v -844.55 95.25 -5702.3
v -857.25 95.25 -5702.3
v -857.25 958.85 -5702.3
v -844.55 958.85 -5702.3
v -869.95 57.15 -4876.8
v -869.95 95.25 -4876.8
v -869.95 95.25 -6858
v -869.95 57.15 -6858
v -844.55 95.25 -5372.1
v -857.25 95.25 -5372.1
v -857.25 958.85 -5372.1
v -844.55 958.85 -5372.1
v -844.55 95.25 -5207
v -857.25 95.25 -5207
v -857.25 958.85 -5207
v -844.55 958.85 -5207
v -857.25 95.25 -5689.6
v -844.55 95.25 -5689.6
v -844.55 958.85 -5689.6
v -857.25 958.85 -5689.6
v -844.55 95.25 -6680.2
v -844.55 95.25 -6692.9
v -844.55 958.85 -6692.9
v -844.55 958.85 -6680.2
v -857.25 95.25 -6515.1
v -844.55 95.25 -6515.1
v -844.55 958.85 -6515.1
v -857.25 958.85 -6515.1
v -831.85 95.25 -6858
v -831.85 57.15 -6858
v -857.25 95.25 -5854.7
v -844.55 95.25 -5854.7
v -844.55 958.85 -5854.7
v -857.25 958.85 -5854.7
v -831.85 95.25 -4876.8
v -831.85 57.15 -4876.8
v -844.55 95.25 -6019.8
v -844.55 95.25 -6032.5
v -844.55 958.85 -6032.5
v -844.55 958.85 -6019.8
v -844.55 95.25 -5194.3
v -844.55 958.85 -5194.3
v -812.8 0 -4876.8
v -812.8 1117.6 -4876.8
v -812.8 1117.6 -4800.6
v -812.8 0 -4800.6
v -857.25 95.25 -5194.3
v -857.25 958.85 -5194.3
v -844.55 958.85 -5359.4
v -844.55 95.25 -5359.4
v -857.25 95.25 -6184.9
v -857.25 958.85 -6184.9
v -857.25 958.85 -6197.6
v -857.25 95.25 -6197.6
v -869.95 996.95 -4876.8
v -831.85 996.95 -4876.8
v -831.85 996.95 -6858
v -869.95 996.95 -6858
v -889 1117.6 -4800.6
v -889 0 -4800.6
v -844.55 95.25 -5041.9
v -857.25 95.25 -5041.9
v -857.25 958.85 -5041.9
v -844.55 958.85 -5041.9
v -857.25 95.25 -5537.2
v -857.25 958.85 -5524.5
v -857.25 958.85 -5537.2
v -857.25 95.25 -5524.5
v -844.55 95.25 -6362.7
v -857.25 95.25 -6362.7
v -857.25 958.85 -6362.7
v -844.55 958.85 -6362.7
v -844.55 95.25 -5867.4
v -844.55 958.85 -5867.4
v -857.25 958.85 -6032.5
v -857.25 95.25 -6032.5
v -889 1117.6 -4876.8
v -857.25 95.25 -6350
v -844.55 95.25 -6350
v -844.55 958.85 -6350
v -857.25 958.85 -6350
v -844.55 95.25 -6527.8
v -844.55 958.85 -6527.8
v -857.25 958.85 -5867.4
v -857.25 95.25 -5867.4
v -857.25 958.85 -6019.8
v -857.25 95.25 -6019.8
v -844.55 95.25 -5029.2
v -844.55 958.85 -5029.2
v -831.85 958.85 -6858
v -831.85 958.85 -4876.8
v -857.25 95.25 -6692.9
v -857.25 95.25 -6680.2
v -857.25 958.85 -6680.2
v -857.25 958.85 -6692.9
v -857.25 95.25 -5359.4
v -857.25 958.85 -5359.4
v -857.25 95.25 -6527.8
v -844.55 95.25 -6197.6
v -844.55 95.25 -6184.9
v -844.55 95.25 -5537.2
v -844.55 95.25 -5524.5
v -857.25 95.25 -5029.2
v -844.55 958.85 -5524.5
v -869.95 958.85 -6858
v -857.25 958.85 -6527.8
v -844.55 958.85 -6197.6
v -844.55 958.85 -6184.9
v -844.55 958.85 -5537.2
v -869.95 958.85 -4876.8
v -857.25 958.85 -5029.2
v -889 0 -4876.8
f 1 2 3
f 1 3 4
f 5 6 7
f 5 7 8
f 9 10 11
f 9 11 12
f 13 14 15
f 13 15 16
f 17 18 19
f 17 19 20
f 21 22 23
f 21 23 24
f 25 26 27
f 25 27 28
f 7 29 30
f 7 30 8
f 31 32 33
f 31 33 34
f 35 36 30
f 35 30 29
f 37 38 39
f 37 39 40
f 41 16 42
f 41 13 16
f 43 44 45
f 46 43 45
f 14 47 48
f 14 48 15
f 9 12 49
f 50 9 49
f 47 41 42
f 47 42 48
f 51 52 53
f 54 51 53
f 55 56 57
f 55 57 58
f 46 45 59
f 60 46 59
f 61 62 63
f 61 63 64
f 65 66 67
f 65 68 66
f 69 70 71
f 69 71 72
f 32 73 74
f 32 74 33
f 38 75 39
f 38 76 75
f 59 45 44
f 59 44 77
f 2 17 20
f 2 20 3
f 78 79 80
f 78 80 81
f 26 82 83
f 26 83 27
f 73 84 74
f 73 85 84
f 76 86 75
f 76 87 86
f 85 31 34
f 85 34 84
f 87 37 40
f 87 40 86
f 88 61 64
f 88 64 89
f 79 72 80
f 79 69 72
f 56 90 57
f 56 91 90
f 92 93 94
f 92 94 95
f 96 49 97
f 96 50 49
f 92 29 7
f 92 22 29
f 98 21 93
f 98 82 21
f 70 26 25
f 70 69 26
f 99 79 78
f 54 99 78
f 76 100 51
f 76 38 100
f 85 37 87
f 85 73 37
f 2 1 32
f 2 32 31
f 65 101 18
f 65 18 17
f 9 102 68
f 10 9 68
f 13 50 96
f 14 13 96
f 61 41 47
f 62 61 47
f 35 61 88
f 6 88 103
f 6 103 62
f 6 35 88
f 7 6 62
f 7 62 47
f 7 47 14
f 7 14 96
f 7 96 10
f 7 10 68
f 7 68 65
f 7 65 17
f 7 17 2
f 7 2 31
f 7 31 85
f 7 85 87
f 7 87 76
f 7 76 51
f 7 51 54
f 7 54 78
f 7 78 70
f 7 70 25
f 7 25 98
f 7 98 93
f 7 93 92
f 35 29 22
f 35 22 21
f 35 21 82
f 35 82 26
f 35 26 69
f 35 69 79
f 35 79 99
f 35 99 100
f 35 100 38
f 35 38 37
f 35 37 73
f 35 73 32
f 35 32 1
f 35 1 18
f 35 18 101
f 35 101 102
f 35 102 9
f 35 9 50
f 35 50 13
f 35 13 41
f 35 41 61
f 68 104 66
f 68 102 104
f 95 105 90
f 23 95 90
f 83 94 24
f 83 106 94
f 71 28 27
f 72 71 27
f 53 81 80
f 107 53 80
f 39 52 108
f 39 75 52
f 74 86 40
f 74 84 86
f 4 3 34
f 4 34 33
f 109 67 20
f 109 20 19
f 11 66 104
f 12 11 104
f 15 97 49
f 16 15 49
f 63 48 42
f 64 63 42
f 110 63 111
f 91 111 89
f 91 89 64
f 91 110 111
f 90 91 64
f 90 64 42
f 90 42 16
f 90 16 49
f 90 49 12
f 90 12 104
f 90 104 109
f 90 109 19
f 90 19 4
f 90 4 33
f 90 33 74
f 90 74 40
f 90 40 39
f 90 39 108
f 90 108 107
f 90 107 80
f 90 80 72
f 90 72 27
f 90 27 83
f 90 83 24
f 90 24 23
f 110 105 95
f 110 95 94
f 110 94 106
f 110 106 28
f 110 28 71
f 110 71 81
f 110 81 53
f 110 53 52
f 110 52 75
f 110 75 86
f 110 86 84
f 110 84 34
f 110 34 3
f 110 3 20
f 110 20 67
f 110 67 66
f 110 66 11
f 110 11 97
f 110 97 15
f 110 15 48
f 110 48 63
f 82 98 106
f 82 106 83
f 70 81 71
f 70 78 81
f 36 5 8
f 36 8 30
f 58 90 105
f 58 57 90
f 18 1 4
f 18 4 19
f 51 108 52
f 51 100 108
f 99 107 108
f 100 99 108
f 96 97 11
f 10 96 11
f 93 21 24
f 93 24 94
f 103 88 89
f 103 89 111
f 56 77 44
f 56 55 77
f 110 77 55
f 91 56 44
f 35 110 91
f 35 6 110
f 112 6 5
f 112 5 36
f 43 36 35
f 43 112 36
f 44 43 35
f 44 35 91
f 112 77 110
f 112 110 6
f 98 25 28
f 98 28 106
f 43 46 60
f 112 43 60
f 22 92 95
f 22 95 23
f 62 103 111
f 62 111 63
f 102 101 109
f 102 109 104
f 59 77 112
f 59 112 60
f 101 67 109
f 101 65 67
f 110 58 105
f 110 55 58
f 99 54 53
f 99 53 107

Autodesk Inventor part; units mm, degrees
ref_plane "YZ Plane" through (0, 0, 0) normal (1, 0, 0) x (0, 1, 0)
ref_plane "XZ Plane" through (0, 0, 0) normal (0, 1, 0) x (-1, 0, 0)
ref_plane "XY Plane" through (0, 0, 0) normal (0, 0, 1) x (1, 0, 0)
sketch "Sketch1" plane through (889, 0, -4876.8) normal (0, 1, 0) x (-1, 0, 0)
  line L0 (1778, 0) -> (1778, 9753.6)
  line L1 (1778, 0) -> (1701.8, 0)
  line L2 (1701.8, 0) -> (1701.8, 76.2)
  line L3 (1701.8, 76.2) -> (1778, 76.2)
  line L4 (1778, 76.2) -> (1778, 0)
  line L5 (889, 0) -> (889, 9753.6) construction
  line L6 (0, 9753.6) -> (1778, 9753.6)
  point P0 (0, 0)
  dimension "d0" = 76.2
  dimension "d1" = 76.2
extrude "Extrusion1" add sketch "Sketch1" along normal blind 1117.6
sketch "Sketch2" plane through (-812.8, 0, -4876.8) normal (0, 0, -1) x (-1, 0, 0)
  line L0 (19.05, 95.25) -> (57.15, 95.25)
  line L1 (57.15, 95.25) -> (57.15, 57.15)
  line L2 (57.15, 57.15) -> (19.05, 57.15)
  line L3 (19.05, 57.15) -> (19.05, 95.25)
  line L4 (19.05, 95.25) -> (57.15, 57.15) construction
  line L5 (57.15, 95.25) -> (19.05, 57.15) construction
  line L6 (19.05, 996.95) -> (57.15, 996.95)
  line L7 (57.15, 996.95) -> (57.15, 958.85)
  line L8 (57.15, 958.85) -> (19.05, 958.85)
  line L9 (19.05, 958.85) -> (19.05, 996.95)
  line L10 (19.05, 996.95) -> (57.15, 958.85) construction
  line L11 (57.15, 996.95) -> (19.05, 958.85) construction
  line L12 (76.2, 55.9997) -> (76.2, 1188.6397)
  line L13 (76.2, 0) -> (76.2, 1117.6) projected
  line L14 (0, 0) -> (76.2, 0) projected
  point P0 (-812.8, 0)
  point P1 (64.1185, -20.2003)
  point P2 (38.1, 76.2)
  point P3 (38.1, 977.9)
  dimension "d5" = 38.1
  dimension "d6" = 38.1
  dimension "d7" = 38.1
  dimension "d9" = 863.6
  dimension "d10" = 38.1
  dimension "d11" = 38.1
  dimension "d12" = 38.1
  dimension "d13" = 76.2
extrude "Extrusion2" add sketch "Sketch2" along normal blind 1981.2
sketch "Sketch3" plane through (-831.85, 95.25, -4876.8) normal (0, 1, 0) x (1, 0, 0)
  line L0 (-19.05, 7.9484) -> (-19.05, 1981.2) construction
  line L1 (345.7063, 1981.2) -> (-383.8063, 1981.2)
  line L2 (-12.7, 152.4) -> (-25.4, 152.4)
  line L3 (-25.4, 152.4) -> (-25.4, 165.1)
  line L4 (-25.4, 165.1) -> (-12.7, 165.1)
  line L5 (-12.7, 165.1) -> (-12.7, 152.4)
  line L6 (-12.7, 152.4) -> (-25.4, 165.1) construction
  line L7 (-25.4, 152.4) -> (-12.7, 165.1) construction
  line L8 (-25.4, 317.5) -> (-25.4, 330.2)
  line L9 (-25.4, 330.2) -> (-12.7, 330.2)
  line L10 (-12.7, 330.2) -> (-12.7, 317.5)
  line L11 (-12.7, 317.5) -> (-25.4, 317.5)
  line L12 (-25.4, 482.6) -> (-25.4, 495.3)
  line L13 (-25.4, 495.3) -> (-12.7, 495.3)
  line L14 (-12.7, 495.3) -> (-12.7, 482.6)
  line L15 (-12.7, 482.6) -> (-25.4, 482.6)
  line L16 (-25.4, 647.7) -> (-25.4, 660.4)
  line L17 (-25.4, 660.4) -> (-12.7, 660.4)
  line L18 (-12.7, 660.4) -> (-12.7, 647.7)
  line L19 (-12.7, 647.7) -> (-25.4, 647.7)
  line L20 (-25.4, 812.8) -> (-25.4, 825.5)
  line L21 (-25.4, 825.5) -> (-12.7, 825.5)
  line L22 (-12.7, 825.5) -> (-12.7, 812.8)
  line L23 (-12.7, 812.8) -> (-25.4, 812.8)
  line L24 (-25.4, 977.9) -> (-25.4, 990.6)
  line L25 (-25.4, 990.6) -> (-12.7, 990.6)
  line L26 (-12.7, 990.6) -> (-12.7, 977.9)
  line L27 (-12.7, 977.9) -> (-25.4, 977.9)
  line L28 (-25.4, 1143) -> (-25.4, 1155.7)
  line L29 (-25.4, 1155.7) -> (-12.7, 1155.7)
  line L30 (-12.7, 1155.7) -> (-12.7, 1143)
  line L31 (-12.7, 1143) -> (-25.4, 1143)
  line L32 (-25.4, 1308.1) -> (-25.4, 1320.8)
  line L33 (-25.4, 1320.8) -> (-12.7, 1320.8)
  line L34 (-12.7, 1320.8) -> (-12.7, 1308.1)
  line L35 (-12.7, 1308.1) -> (-25.4, 1308.1)
  line L36 (-25.4, 1473.2) -> (-25.4, 1485.9)
  line L37 (-25.4, 1485.9) -> (-12.7, 1485.9)
  line L38 (-12.7, 1485.9) -> (-12.7, 1473.2)
  line L39 (-12.7, 1473.2) -> (-25.4, 1473.2)
  line L40 (-25.4, 1638.3) -> (-25.4, 1651)
  line L41 (-25.4, 1651) -> (-12.7, 1651)
  line L42 (-12.7, 1651) -> (-12.7, 1638.3)
  line L43 (-12.7, 1638.3) -> (-25.4, 1638.3)
  line L44 (-25.4, 1803.4) -> (-25.4, 1816.1)
  line L45 (-25.4, 1816.1) -> (-12.7, 1816.1)
  line L46 (-12.7, 1816.1) -> (-12.7, 1803.4)
  line L47 (-12.7, 1803.4) -> (-25.4, 1803.4)
  line L48 (19.05, 0) -> (-57.15, 0) projected
  line L49 (-38.1, 0) -> (-38.1, 1981.2) projected
  line L50 (-38.1, 1981.2) -> (0, 1981.2) projected
  point P0 (831.85, -4876.8)
  point P1 (-524.2437, -132.1024)
  point P2 (-19.05, 158.75)
  dimension "d20" = 12.7
  dimension "d21" = 12.7
  dimension "d23" = 165.1
  dimension "d25" = 152.4
  dimension "d27" = 19.05
  dimension "d28" = 0
extrude "Extrusion3" add sketch "Sketch3" along normal up to surface (863.6 mm away)
properties part number "Railing" material "Iron, Wrought"
